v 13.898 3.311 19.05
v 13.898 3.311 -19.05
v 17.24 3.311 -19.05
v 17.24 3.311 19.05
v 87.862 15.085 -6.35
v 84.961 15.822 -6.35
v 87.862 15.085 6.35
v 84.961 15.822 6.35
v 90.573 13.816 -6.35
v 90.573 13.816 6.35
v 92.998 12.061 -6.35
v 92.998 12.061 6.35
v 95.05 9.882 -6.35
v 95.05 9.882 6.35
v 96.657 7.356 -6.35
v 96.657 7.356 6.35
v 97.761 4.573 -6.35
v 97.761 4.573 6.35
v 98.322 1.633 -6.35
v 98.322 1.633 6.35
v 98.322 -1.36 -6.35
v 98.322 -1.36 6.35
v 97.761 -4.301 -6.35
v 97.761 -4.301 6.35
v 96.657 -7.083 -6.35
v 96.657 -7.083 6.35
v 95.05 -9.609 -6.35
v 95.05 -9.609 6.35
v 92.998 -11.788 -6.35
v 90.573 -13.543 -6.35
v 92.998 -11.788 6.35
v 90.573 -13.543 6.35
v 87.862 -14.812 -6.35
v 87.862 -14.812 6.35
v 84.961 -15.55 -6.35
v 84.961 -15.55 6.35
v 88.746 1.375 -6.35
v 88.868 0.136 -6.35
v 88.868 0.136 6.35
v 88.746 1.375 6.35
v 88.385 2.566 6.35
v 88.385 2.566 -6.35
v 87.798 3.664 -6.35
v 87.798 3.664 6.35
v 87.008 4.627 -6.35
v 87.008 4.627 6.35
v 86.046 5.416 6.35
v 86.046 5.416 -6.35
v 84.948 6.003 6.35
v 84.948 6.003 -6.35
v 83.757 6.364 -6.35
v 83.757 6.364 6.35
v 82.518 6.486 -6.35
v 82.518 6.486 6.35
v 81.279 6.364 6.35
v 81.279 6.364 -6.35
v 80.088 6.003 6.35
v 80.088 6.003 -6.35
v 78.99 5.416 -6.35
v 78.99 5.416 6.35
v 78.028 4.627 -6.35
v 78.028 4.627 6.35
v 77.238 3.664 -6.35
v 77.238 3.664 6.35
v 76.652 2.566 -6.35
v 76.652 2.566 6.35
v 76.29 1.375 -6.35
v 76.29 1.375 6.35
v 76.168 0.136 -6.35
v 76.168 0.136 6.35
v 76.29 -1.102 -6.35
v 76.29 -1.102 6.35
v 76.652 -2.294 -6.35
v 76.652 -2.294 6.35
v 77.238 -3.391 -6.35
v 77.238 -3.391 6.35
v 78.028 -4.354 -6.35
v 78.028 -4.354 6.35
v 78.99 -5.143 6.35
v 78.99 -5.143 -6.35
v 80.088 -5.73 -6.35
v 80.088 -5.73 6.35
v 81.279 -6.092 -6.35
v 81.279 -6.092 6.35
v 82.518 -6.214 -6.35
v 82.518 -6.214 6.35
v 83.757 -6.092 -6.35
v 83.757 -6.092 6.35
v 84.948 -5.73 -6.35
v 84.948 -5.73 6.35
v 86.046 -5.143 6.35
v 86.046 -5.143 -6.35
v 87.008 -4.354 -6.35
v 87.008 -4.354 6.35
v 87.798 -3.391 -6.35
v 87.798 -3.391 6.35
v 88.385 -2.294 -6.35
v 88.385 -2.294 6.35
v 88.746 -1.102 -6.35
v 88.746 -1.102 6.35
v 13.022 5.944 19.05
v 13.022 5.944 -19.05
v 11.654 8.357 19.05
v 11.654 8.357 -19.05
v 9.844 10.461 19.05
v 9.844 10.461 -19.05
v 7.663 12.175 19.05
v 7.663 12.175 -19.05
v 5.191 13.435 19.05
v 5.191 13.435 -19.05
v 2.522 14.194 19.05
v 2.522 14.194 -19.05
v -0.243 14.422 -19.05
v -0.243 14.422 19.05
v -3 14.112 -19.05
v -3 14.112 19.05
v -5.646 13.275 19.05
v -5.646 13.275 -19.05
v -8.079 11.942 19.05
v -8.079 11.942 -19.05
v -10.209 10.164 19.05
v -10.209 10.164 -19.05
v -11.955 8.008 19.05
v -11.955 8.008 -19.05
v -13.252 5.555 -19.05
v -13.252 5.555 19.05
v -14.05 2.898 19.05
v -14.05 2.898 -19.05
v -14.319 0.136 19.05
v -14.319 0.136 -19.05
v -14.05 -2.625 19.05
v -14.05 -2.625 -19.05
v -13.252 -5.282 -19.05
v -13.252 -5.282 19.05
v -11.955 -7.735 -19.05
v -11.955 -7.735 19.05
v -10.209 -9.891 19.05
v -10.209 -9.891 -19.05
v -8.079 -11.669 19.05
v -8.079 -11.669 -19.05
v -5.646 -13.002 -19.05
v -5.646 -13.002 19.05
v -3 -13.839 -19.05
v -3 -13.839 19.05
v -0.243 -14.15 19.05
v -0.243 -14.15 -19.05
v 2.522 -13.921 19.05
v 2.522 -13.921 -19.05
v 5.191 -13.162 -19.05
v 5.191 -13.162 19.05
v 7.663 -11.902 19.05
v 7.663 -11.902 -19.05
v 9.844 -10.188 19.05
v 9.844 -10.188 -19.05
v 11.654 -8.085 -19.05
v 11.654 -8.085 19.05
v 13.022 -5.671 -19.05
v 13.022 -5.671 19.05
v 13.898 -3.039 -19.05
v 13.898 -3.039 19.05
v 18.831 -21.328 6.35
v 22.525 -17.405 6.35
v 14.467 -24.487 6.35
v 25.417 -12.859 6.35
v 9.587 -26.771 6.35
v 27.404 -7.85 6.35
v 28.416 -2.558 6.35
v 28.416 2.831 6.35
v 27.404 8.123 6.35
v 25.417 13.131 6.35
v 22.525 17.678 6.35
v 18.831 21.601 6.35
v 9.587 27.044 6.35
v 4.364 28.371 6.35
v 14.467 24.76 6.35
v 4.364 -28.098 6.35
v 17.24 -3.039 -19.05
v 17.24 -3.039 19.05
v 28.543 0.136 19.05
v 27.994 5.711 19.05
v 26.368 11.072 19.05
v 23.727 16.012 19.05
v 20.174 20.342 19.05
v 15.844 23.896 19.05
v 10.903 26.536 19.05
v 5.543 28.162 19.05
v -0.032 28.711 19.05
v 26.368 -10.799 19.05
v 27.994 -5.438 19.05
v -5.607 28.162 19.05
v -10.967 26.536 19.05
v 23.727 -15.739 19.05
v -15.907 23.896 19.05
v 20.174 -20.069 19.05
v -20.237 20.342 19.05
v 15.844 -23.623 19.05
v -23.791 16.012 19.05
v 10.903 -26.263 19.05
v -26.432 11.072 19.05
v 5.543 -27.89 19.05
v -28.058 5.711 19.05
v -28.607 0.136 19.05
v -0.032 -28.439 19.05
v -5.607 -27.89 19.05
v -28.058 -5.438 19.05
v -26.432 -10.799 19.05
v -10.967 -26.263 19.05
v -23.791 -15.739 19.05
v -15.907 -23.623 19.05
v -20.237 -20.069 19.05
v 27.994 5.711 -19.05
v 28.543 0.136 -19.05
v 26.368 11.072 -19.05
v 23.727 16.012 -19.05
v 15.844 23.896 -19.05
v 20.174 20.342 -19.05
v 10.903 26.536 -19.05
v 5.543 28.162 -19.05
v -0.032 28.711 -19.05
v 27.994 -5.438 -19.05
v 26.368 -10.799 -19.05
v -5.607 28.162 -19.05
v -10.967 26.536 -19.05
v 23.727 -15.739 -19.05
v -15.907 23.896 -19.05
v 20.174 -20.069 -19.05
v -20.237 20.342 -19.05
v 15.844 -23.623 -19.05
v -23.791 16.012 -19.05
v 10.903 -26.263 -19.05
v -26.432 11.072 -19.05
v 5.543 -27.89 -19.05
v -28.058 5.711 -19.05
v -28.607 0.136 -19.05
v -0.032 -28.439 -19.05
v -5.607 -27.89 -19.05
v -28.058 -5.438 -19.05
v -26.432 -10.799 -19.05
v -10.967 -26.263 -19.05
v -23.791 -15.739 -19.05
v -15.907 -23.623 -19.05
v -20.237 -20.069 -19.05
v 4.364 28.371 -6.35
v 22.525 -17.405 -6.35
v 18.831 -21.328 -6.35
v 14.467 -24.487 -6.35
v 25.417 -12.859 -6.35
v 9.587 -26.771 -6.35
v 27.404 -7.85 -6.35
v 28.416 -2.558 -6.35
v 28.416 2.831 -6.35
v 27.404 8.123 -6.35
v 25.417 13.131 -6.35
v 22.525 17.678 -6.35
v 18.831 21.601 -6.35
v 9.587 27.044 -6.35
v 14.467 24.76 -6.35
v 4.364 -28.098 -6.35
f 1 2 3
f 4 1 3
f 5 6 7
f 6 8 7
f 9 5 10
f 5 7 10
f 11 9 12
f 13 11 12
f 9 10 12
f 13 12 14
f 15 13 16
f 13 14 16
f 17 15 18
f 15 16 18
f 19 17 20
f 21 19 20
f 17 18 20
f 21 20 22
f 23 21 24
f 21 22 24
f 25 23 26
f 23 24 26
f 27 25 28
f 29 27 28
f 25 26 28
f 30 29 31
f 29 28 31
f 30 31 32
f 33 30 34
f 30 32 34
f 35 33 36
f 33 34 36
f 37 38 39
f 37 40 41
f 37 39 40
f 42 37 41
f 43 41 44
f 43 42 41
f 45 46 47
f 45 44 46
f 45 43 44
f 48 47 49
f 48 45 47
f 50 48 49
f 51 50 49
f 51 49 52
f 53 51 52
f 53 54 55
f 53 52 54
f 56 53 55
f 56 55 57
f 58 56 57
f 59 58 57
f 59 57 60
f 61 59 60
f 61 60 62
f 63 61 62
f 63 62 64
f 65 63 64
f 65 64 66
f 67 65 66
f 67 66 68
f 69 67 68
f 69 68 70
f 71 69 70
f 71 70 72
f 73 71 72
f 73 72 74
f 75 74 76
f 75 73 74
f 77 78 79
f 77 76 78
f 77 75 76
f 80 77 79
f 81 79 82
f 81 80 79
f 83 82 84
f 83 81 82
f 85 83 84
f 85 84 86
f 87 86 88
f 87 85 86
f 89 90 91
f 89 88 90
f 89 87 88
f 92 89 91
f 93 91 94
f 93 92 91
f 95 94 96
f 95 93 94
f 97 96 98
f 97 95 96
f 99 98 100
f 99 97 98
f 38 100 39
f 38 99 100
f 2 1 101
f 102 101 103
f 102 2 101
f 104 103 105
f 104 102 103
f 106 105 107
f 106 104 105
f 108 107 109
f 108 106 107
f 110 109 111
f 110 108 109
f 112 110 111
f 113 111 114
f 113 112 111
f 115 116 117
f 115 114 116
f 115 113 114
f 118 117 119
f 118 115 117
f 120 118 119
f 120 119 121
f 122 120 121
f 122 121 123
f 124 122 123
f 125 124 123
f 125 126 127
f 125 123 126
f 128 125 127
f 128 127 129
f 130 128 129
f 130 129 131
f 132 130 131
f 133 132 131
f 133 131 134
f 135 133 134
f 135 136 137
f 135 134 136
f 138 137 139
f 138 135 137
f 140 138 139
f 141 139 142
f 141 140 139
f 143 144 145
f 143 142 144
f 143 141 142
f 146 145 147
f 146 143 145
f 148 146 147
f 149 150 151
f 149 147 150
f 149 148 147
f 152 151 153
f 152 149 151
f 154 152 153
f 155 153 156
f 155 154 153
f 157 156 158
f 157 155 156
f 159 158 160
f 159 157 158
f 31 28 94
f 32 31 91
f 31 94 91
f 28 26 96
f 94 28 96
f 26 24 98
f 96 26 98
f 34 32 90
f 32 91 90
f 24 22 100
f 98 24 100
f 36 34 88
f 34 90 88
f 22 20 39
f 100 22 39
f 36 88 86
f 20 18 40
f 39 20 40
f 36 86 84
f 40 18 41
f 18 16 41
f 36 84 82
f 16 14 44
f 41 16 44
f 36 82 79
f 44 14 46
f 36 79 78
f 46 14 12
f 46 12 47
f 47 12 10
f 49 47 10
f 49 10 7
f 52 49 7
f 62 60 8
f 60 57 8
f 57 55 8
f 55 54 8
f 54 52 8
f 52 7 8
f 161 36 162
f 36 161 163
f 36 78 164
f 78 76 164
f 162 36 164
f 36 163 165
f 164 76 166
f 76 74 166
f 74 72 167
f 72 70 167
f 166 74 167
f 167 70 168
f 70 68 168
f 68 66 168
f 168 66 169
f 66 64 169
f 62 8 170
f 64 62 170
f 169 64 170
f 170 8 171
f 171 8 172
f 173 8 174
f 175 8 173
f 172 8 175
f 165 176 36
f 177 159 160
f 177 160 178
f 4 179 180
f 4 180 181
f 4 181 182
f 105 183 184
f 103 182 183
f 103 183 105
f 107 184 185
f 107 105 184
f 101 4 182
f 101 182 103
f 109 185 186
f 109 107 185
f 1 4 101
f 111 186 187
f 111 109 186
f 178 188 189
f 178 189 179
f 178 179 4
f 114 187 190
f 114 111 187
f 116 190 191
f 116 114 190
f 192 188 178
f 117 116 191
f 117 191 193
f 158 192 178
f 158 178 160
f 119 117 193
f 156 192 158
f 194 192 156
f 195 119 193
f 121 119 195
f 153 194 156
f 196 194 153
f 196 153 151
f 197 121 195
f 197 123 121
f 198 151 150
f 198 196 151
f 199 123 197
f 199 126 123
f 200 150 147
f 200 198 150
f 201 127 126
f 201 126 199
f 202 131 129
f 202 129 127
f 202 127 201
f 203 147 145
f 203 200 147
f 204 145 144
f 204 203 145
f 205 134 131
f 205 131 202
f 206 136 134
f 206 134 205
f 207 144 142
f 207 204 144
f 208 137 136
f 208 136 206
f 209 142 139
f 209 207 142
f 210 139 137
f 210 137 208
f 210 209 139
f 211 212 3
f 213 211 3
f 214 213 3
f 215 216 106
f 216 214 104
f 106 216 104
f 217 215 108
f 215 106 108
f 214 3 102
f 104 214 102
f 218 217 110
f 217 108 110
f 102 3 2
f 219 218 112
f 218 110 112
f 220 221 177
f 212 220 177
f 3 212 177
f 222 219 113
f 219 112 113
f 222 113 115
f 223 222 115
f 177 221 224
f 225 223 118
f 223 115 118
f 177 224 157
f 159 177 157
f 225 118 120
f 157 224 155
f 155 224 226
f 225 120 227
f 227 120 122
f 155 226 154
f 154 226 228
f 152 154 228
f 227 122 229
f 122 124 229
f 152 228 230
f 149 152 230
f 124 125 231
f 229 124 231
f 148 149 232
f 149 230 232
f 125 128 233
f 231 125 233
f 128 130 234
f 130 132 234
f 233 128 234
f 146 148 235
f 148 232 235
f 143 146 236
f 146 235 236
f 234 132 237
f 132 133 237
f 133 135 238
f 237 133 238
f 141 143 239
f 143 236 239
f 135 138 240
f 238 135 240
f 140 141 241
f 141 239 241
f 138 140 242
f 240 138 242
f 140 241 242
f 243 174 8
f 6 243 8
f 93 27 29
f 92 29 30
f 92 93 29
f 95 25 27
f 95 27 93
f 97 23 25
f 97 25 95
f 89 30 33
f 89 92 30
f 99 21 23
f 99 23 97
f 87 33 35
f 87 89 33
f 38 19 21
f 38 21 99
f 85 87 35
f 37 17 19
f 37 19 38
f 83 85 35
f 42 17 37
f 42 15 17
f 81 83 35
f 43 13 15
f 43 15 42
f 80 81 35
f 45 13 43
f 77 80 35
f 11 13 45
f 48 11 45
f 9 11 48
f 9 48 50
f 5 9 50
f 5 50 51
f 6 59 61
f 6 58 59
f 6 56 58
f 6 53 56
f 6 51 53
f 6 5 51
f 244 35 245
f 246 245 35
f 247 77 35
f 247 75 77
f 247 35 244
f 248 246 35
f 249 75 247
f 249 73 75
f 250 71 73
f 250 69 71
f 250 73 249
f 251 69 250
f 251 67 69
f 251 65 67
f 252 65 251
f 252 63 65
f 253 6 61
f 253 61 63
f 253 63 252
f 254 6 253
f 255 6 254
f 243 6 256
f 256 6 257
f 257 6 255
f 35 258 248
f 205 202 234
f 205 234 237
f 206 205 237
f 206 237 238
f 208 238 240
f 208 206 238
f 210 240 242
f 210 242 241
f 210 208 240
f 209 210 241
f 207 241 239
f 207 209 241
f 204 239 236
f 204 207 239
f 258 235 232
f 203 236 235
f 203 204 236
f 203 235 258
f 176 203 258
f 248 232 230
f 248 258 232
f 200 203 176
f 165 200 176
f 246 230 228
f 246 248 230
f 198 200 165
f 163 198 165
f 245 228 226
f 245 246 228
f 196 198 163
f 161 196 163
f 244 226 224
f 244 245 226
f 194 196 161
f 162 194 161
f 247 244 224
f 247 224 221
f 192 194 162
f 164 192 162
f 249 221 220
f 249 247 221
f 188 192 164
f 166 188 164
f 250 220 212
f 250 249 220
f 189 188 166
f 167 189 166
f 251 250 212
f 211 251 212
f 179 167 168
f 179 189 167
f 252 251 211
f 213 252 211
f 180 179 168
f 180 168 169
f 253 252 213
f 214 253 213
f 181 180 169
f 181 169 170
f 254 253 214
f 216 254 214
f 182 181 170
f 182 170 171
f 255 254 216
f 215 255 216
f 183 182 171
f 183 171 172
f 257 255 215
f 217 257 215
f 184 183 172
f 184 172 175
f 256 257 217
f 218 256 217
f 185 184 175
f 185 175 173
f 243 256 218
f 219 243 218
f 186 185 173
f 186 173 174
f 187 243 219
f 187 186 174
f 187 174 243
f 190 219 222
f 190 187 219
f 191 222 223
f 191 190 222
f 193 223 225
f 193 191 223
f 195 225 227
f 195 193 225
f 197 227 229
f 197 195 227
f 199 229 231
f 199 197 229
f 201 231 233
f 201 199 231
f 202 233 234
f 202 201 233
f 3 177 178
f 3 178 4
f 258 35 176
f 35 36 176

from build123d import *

# Parameters (mm, degrees)
SKETCH2_R               = 28.575
SKETCH2_R_2             = 14.2875
BOSS_EXTRUDE1_DEPTH     = 19.05
BOSS_EXTRUDE3_DEPTH     = 6.35
CUT_EXTRUDE3_DEPTH      = 105.251956428
CUT_EXTRUDE3_DEPTH_BACK = 105.251956428
SKETCH6_R               = 6.35
SKETCH6_W               = 3.341744035
SKETCH6_H               = 6.35


with BuildPart() as part:
    # Sketch2 → Boss-Extrude1 (new, symmetric)
    with BuildSketch(Plane.XY):
        with Locations(Location((-0.0317959, 0.136414209, 0), (0, 0, 180))):
            Circle(SKETCH2_R)
        with Locations(Location((-0.0317959, 0.136414209, 0), (0, 0, 180))):
            Circle(SKETCH2_R_2, mode=Mode.SUBTRACT)
    extrude(amount=BOSS_EXTRUDE1_DEPTH, both=True)

    # Sketch5 → Boss-Extrude3 (add, symmetric)
    with BuildSketch(Plane.XY):
        with BuildLine():
            Line((4.364357946, 28.371223512), (84.960511793, 15.822419377))
            ThreePointArc((84.960511793, 15.822419377), (98.3932041, 0.136414209), (84.960511793, -15.549590959))
            Line((84.960511793, -15.549590959), (4.364357946, -28.098395094))
            ThreePointArc((4.364357946, -28.098395094), (28.5432041, 0.136414209), (4.364357946, 28.371223512))
        make_face()
    extrude(amount=BOSS_EXTRUDE3_DEPTH, both=True)

    # Sketch6 → Cut-Extrude3 (cut, two sides: drawn at the far end of the back side and taken through both)
    with BuildSketch(Plane.XY.offset(-CUT_EXTRUDE3_DEPTH_BACK)):
        with Locations((82.5182041, 0.136414209)):
            Circle(SKETCH6_R)
        with Locations((15.569332083, 0.136414209)):
            Rectangle(SKETCH6_W, SKETCH6_H)
    extrude(amount=CUT_EXTRUDE3_DEPTH + CUT_EXTRUDE3_DEPTH_BACK, mode=Mode.SUBTRACT)


solid = part.part
